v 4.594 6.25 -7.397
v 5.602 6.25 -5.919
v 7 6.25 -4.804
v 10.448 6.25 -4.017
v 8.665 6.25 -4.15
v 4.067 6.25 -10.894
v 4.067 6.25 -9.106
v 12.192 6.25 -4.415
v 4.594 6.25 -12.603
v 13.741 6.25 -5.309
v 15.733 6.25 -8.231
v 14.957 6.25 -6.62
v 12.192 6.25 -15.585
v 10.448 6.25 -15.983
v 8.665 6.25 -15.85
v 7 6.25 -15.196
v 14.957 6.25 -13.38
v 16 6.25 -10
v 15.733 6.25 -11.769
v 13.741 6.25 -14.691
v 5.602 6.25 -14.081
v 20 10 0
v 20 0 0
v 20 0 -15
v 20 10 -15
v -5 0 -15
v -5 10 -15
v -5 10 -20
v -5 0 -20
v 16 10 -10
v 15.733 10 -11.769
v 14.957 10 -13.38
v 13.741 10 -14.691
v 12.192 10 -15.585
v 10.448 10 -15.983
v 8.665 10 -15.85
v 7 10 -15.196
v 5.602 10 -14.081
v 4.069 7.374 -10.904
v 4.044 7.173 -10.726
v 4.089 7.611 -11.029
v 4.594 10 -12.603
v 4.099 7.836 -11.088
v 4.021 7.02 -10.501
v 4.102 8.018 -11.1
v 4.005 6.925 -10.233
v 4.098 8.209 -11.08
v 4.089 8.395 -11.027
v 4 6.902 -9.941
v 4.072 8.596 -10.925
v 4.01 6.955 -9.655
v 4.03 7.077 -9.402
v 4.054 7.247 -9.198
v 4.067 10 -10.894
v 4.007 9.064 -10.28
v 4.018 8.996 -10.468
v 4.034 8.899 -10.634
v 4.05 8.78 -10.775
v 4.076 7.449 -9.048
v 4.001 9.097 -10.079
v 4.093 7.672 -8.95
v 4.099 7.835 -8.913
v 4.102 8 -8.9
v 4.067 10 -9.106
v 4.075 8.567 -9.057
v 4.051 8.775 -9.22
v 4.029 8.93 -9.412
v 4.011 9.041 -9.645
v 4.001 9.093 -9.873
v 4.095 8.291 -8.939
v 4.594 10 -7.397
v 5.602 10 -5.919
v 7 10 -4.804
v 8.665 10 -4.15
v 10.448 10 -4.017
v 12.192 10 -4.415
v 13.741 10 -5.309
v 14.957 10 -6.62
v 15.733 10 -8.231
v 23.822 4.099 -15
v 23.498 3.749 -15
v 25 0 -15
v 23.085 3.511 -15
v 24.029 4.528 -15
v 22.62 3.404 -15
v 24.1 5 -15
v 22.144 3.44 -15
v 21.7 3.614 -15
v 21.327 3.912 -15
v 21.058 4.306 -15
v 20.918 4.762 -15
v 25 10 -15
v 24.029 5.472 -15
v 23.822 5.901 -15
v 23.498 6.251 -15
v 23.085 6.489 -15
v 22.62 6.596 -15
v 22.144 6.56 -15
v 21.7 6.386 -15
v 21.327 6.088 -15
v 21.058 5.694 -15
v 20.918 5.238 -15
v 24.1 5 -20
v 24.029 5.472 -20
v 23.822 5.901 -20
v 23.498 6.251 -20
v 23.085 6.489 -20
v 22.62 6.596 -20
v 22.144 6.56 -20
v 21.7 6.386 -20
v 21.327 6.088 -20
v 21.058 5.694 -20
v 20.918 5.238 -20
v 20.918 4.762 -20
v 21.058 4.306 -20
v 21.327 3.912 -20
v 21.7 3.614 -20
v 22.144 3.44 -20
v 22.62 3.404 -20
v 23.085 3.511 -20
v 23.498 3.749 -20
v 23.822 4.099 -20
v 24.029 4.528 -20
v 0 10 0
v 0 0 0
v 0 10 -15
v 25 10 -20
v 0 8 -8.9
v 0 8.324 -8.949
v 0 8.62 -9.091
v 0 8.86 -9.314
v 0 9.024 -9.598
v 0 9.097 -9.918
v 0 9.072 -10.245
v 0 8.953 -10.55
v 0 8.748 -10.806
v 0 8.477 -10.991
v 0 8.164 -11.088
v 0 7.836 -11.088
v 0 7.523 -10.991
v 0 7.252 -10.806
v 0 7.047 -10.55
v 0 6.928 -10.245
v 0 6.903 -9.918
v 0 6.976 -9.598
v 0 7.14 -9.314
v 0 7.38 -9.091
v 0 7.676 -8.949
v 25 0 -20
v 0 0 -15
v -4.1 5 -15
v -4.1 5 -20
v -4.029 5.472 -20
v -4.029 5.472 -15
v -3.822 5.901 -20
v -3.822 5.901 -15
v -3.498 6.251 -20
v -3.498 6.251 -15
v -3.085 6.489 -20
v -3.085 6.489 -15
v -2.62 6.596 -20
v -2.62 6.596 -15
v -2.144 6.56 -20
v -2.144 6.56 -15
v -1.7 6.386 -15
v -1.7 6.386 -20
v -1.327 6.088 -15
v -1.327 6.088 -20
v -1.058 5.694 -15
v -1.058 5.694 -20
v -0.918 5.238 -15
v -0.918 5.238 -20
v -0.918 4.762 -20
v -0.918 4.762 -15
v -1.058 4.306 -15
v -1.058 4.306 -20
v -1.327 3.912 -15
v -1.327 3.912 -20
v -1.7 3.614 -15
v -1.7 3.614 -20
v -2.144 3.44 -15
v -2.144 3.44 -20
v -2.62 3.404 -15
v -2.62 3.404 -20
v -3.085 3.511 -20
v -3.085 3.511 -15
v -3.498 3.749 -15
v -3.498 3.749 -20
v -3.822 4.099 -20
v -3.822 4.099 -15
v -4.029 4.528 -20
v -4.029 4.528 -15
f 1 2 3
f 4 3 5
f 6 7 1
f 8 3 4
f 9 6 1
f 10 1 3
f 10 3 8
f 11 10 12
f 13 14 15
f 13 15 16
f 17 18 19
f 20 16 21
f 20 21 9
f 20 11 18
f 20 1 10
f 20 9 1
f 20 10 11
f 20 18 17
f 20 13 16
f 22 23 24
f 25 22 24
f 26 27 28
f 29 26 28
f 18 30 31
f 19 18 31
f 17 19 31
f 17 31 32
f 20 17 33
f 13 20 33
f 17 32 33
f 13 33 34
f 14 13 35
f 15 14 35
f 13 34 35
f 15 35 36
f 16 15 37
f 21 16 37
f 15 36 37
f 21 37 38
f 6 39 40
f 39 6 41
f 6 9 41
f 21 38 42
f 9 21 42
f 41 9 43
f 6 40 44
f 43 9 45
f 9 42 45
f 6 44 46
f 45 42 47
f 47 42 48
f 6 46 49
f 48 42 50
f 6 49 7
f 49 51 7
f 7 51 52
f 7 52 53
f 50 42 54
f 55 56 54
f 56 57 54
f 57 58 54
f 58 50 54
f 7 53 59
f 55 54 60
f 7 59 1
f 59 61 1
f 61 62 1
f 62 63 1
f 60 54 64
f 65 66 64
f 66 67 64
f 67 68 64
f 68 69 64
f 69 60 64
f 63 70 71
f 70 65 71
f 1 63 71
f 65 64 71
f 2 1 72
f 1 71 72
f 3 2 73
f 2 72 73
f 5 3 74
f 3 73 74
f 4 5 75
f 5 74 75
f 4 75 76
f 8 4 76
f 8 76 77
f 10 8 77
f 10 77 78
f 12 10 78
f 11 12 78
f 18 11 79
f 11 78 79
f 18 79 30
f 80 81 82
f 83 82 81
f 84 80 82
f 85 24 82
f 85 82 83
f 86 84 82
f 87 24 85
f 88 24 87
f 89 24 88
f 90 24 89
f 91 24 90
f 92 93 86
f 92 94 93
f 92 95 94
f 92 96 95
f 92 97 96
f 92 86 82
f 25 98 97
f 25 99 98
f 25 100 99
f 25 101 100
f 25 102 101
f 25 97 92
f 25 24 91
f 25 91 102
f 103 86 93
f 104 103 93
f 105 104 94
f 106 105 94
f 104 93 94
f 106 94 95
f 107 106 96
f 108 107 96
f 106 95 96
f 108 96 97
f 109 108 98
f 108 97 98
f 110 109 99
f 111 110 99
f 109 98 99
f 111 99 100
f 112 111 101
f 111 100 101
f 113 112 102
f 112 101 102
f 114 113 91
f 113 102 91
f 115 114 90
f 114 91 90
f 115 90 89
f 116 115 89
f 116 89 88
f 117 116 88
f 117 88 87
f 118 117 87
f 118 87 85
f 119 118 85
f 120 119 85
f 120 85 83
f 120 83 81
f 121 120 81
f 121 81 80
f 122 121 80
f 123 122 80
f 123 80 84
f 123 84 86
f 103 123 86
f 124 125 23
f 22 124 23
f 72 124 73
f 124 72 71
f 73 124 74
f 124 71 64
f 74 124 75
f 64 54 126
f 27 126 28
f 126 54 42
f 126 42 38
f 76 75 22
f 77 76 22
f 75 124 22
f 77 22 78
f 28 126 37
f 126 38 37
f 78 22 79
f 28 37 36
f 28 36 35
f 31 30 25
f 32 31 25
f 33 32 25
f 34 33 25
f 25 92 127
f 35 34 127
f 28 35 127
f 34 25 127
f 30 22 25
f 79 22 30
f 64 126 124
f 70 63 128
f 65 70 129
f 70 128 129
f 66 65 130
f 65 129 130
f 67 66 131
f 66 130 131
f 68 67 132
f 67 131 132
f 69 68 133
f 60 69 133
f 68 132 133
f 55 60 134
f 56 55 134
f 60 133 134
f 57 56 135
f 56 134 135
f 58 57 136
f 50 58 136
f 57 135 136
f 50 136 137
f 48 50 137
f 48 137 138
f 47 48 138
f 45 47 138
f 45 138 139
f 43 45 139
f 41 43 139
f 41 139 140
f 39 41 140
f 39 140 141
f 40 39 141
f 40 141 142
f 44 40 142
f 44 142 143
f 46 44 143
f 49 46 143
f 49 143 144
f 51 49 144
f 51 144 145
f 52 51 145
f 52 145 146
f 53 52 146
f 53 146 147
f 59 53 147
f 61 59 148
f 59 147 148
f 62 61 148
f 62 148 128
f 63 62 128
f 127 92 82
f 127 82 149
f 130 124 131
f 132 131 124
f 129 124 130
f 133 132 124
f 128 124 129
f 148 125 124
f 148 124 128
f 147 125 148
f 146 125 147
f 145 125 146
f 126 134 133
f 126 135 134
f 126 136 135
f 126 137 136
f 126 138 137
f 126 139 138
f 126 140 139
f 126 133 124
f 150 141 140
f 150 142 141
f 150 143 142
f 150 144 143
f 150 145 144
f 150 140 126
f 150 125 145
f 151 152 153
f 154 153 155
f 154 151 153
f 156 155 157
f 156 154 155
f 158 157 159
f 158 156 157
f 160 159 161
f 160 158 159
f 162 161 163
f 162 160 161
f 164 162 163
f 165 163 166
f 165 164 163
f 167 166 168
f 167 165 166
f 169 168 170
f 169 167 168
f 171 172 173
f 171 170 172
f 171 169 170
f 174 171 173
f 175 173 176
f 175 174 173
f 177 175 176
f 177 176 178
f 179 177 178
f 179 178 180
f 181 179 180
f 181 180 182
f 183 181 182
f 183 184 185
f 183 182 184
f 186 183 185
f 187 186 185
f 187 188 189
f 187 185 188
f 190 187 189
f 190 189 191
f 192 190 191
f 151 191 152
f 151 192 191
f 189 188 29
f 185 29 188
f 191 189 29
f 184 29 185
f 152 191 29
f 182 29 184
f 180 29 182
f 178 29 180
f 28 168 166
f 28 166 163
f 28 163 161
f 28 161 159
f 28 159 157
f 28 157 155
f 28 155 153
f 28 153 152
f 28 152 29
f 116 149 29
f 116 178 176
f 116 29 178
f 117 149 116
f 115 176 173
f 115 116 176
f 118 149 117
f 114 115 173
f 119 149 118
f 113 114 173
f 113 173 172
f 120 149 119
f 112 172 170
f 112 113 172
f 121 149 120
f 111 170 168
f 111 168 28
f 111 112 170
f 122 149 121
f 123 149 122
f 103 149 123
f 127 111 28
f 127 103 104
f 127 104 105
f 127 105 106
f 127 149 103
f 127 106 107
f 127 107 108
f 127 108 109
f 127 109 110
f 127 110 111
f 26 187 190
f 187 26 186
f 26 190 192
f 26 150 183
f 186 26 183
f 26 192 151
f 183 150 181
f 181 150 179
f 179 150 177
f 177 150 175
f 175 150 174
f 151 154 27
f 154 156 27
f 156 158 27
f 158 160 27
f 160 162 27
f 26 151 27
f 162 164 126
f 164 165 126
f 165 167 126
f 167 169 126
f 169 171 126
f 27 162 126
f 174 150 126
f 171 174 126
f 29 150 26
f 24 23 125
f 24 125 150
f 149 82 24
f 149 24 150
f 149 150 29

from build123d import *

# Parameters (mm, degrees)
SKETCH1_W           = 20
SKETCH1_H           = 20
BOSS_EXTRUDE1_DEPTH = 10
SKETCH2_R           = 6
CUT_EXTRUDE1_DEPTH  = 3.75
CUT_EXTRUDE3_REACH  = 22
SKETCH5_R           = 1.1
SKETCH6_W           = 5
SKETCH6_H           = 10
BOSS_EXTRUDE2_DEPTH = 5
SKETCH7_R           = 1.6
CUT_EXTRUDE4_DEPTH  = 6


with BuildPart() as part:
    # Sketch1 → Boss-Extrude1 (new body)
    with BuildSketch(Plane(origin=(0, 0, 0), x_dir=(1, 0, 0), z_dir=(0, 1, 0))):
        with Locations((10, 10)):
            Rectangle(SKETCH1_W, SKETCH1_H)
    extrude(amount=BOSS_EXTRUDE1_DEPTH)

    # Sketch2 → Cut-Extrude1 (cut)
    with BuildSketch(Plane(origin=(0, 10, 0), x_dir=(1, 0, 0), z_dir=(0, 1, 0))):
        with Locations((10, 10)):
            Circle(SKETCH2_R)
    extrude(amount=-CUT_EXTRUDE1_DEPTH, mode=Mode.SUBTRACT)

    # Sketch5 → Cut-Extrude3 (cut, up to next)
    with BuildSketch(Plane.ZY, mode=Mode.PRIVATE) as cut_extrude3_sk1:
        with Locations((-10, 8)):
            Circle(SKETCH5_R)
    cut_extrude3_tool1 = extrude(cut_extrude3_sk1.sketch, amount=-CUT_EXTRUDE3_REACH, mode=Mode.PRIVATE) & part.part
    add(cut_extrude3_tool1.solids().sort_by_distance((0, 8, -10))[0], mode=Mode.SUBTRACT)

    # Sketch6 → Boss-Extrude2 (add)
    with BuildSketch(Plane(origin=(20, 0, 0), x_dir=(0, 0, -1), z_dir=(1, 0, 0))):
        with Locations((17.5, 5)):
            Rectangle(SKETCH6_W, SKETCH6_H)
    boss_extrude2 = extrude(amount=BOSS_EXTRUDE2_DEPTH)

    # Sketch7 → Cut-Extrude4 (cut, through all)
    with BuildSketch(Plane.XY.offset(-15)):
        with Locations((22.5, 5)):
            Circle(SKETCH7_R)
    cut_extrude4 = extrude(amount=-CUT_EXTRUDE4_DEPTH, mode=Mode.SUBTRACT)

    # Mirror1: Boss-Extrude2, Cut-Extrude4 across plane
    add(boss_extrude2.mirror(Plane.ZY.offset(-10)))
    add(cut_extrude4.mirror(Plane.ZY.offset(-10)), mode=Mode.SUBTRACT)


solid = part.part
